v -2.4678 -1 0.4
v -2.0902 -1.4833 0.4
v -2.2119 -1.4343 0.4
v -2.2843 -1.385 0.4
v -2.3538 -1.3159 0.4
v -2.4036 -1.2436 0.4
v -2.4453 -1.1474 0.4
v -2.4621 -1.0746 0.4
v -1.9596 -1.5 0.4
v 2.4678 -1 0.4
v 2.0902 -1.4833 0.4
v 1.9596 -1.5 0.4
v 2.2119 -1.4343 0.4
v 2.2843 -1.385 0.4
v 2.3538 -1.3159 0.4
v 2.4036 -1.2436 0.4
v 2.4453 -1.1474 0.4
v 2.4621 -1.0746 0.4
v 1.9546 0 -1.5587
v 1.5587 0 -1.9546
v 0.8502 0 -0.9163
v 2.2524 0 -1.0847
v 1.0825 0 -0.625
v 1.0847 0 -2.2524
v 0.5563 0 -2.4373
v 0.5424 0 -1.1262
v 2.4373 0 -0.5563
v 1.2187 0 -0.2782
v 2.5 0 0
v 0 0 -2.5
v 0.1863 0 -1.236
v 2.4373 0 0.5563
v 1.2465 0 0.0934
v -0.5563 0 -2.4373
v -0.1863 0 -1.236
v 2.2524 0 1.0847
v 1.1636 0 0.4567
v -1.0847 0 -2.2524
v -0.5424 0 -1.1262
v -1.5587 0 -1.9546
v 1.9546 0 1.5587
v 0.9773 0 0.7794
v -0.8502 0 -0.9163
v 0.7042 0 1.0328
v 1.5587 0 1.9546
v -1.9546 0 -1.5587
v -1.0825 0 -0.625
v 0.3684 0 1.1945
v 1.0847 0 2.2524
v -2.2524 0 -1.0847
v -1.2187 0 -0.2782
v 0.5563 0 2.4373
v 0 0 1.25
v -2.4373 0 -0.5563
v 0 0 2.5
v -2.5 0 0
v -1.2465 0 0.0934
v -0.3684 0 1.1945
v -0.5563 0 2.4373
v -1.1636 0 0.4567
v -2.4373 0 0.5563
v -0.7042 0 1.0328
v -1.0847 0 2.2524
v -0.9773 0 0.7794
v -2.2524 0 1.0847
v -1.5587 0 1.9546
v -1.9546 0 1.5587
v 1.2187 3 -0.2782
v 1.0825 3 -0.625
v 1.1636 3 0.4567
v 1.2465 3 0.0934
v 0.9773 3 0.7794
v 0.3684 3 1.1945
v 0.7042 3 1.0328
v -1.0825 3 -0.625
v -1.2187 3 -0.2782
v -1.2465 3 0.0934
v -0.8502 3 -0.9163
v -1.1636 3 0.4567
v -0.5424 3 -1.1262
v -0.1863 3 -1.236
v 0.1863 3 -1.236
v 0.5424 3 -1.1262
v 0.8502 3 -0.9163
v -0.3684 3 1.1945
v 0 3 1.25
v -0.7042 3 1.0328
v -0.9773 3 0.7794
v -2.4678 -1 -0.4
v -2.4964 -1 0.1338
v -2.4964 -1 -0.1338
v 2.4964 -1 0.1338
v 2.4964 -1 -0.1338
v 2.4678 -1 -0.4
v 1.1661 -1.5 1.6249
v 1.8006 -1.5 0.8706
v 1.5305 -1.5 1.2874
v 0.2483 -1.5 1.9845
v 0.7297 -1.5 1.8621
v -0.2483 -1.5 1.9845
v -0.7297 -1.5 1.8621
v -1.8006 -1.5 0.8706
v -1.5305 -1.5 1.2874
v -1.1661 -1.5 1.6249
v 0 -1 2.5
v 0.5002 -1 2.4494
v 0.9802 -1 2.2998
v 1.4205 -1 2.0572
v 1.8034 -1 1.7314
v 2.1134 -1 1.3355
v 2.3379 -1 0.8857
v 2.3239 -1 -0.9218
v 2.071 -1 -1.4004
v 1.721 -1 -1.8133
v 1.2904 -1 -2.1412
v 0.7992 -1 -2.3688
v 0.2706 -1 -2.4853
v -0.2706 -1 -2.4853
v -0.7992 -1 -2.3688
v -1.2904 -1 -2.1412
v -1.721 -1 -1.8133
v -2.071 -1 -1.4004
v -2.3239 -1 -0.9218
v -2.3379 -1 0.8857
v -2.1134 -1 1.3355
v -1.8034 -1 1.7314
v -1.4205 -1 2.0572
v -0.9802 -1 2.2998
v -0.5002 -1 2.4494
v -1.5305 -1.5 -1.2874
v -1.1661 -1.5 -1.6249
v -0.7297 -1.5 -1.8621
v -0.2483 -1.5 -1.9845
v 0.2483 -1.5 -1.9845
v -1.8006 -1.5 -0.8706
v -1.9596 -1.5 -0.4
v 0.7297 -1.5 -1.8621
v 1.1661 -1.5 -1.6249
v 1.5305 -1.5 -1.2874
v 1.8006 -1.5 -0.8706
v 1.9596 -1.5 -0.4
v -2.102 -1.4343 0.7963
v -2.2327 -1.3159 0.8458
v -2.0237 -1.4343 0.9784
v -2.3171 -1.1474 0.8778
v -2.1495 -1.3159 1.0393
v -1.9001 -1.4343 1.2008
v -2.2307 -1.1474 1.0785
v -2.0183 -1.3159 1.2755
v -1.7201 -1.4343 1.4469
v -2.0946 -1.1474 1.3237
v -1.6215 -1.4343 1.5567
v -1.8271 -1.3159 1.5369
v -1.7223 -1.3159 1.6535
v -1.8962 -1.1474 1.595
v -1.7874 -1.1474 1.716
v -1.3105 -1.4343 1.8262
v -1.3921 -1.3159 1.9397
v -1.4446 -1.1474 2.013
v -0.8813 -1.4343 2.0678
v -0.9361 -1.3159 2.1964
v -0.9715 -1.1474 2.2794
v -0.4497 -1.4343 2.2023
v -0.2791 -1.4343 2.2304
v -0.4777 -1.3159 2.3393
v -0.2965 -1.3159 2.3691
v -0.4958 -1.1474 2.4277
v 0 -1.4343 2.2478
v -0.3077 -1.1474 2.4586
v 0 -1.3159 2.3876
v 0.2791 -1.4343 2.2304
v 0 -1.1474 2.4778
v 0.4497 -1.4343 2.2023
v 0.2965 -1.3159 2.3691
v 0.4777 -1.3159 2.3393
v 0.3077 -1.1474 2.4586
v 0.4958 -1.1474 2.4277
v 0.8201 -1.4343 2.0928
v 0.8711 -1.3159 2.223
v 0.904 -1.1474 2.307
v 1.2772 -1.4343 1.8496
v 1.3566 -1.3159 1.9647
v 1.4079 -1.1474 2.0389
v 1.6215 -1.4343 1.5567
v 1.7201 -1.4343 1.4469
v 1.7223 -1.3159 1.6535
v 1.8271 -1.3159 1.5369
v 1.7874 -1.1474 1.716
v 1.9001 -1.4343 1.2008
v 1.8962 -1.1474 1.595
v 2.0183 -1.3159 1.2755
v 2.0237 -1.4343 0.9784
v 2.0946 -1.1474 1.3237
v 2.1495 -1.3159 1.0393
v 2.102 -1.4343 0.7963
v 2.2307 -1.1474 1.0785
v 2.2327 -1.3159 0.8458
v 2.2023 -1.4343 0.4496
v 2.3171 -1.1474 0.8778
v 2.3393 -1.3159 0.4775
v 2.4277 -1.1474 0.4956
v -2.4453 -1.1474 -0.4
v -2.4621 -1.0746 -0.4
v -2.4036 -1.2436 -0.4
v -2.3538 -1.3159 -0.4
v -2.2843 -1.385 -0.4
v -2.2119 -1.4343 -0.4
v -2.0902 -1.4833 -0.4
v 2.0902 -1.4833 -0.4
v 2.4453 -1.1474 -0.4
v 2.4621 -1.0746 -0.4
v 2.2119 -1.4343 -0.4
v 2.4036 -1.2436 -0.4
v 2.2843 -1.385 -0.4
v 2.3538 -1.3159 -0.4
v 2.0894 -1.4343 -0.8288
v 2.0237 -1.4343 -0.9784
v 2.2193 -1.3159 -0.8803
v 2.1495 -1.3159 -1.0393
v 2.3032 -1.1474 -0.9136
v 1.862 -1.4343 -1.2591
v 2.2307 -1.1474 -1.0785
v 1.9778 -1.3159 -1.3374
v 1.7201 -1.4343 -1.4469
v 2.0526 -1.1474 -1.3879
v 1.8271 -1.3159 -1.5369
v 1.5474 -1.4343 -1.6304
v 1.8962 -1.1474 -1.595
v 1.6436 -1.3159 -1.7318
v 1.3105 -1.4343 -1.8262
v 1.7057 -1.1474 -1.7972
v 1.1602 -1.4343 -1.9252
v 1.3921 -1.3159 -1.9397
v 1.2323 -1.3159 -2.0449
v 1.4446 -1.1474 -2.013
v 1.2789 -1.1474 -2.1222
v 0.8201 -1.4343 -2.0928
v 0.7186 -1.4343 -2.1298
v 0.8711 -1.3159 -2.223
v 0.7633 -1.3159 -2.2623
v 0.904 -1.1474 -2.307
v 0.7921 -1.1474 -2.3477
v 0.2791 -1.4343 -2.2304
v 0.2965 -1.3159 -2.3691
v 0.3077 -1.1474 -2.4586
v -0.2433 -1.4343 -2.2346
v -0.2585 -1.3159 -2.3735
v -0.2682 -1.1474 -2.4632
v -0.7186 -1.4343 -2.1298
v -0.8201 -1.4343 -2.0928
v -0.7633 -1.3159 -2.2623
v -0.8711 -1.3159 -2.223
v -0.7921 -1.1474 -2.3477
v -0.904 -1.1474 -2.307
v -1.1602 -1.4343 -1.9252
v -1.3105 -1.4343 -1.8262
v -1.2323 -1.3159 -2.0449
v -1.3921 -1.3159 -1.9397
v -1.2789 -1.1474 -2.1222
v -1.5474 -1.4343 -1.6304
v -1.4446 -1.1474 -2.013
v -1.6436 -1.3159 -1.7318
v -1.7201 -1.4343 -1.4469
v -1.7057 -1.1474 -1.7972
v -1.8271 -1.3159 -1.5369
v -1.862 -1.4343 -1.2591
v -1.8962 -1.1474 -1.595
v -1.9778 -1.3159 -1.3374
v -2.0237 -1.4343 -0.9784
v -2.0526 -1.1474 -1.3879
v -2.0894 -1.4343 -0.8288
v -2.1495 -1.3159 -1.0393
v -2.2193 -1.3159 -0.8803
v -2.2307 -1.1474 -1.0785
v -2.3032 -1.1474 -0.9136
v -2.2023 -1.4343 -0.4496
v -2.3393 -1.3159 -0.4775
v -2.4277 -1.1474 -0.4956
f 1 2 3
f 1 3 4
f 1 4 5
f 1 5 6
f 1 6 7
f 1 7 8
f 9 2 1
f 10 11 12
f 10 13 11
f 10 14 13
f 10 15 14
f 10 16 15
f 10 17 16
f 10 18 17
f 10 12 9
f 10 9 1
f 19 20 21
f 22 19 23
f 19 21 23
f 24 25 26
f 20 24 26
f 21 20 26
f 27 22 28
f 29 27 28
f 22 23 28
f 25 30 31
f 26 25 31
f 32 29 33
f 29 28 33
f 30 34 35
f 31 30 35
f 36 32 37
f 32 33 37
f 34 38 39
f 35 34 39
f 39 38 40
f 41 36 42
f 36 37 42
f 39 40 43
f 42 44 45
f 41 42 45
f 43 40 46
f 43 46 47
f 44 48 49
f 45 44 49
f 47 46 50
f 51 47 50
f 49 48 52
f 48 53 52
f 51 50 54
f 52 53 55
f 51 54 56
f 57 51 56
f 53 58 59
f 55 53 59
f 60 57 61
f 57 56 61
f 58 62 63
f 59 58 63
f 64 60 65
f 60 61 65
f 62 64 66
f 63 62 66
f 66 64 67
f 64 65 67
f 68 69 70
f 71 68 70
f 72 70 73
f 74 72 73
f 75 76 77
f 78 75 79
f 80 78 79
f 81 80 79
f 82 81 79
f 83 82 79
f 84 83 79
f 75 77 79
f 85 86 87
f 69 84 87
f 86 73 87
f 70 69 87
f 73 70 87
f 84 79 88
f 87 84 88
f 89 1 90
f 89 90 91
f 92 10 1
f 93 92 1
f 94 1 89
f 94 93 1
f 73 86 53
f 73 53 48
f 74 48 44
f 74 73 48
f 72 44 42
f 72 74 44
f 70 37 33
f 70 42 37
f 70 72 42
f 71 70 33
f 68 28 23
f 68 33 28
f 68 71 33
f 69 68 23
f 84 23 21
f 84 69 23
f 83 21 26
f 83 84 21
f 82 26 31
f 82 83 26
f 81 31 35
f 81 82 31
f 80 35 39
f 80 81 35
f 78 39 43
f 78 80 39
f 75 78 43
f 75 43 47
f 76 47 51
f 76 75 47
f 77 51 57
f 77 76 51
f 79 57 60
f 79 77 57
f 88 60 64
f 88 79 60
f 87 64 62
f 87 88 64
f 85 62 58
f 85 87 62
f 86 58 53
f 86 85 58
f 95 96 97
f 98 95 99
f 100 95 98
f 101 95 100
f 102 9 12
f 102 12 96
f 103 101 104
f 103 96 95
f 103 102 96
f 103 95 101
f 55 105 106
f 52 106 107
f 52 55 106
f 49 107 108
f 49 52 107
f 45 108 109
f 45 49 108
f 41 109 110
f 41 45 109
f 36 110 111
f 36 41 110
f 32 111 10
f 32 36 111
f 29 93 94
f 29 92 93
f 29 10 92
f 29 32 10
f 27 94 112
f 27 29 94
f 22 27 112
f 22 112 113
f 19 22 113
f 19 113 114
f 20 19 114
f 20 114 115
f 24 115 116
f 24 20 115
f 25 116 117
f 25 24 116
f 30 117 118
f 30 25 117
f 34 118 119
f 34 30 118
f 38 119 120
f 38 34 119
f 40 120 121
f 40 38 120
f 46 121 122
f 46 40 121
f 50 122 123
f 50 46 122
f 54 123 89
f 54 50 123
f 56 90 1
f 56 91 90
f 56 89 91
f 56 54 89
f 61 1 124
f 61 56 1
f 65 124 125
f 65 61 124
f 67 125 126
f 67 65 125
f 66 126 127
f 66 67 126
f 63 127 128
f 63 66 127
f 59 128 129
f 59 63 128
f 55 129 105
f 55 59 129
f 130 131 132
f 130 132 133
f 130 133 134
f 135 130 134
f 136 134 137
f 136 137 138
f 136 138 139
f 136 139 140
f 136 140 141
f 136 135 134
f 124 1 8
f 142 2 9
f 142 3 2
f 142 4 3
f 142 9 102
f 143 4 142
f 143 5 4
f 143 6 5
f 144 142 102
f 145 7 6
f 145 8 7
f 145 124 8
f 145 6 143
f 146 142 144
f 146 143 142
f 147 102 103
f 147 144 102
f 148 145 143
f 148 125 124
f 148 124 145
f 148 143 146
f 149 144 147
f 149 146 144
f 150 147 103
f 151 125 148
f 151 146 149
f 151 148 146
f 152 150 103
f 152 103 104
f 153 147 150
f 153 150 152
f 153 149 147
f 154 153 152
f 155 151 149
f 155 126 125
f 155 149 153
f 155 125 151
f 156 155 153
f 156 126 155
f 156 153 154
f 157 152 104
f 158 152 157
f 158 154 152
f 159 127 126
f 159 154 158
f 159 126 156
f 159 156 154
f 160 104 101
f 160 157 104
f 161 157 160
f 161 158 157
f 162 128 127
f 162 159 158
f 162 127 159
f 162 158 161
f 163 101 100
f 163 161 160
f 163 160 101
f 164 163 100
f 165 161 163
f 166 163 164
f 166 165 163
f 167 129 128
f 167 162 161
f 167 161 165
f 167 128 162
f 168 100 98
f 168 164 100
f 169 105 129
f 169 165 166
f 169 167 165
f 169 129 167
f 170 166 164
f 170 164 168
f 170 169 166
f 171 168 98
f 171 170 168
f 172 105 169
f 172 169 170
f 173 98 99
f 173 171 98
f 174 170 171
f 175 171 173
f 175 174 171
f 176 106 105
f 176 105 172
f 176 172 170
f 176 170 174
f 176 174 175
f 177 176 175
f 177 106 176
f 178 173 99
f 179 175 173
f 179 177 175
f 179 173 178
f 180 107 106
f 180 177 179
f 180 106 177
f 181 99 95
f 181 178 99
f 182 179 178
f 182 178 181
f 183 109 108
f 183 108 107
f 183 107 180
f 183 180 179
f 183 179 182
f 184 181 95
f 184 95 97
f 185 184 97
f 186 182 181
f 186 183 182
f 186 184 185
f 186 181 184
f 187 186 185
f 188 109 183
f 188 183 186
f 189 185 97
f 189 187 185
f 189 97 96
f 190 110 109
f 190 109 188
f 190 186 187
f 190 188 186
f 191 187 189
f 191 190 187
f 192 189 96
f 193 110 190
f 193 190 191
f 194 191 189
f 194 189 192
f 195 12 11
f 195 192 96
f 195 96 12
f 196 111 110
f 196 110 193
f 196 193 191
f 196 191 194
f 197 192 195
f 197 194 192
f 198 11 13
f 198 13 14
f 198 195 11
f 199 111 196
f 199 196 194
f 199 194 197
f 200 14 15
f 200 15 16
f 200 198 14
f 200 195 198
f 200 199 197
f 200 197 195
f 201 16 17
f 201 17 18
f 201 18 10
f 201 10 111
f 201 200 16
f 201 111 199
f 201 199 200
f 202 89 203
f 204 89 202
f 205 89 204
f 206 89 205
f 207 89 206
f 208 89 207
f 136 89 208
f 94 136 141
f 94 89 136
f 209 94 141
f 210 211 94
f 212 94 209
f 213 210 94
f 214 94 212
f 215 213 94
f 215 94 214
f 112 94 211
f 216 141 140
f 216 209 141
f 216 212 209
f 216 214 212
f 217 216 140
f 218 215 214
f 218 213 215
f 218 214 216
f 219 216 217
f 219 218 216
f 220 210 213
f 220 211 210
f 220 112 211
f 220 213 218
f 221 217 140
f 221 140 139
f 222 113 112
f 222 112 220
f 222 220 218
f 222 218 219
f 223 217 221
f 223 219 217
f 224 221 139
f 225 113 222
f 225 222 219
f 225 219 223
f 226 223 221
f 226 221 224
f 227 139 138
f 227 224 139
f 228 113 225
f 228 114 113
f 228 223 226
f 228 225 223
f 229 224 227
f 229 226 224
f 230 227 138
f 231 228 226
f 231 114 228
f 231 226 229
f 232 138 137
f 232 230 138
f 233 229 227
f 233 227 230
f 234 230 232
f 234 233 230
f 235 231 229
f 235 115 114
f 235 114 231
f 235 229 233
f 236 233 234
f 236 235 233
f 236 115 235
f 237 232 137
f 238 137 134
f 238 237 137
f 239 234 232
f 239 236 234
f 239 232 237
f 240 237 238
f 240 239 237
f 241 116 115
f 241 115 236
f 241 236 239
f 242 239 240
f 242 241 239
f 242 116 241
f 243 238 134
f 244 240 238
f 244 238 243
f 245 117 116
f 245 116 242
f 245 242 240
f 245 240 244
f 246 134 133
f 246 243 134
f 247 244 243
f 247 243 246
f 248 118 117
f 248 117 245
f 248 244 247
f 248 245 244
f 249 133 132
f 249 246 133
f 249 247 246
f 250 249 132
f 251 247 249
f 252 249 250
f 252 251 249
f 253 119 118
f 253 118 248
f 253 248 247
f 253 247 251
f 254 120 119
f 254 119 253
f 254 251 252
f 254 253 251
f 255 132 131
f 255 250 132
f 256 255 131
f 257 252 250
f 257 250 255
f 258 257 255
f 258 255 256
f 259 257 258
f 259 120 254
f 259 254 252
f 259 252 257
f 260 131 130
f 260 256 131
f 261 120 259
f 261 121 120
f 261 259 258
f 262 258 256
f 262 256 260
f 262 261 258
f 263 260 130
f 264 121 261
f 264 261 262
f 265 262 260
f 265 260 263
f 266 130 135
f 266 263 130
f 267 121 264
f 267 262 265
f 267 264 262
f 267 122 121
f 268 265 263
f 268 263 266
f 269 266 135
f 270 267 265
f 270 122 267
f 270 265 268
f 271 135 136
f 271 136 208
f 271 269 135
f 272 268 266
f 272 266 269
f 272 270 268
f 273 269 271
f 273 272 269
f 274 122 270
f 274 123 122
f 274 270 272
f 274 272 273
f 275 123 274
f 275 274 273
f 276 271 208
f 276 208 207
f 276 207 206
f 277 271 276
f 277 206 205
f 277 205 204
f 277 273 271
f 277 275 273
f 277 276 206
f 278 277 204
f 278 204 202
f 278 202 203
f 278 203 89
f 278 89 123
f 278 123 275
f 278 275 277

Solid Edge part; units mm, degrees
sketch "Sketch1" plane through (0, 0, 0) normal (1, 0, 0) x (0, 1, 0)
  line L0 (3, 0) -> (-1.5, 0)
  line L1 (-1.5, 0) -> (-1.5, 2)
  arc A0 (-1.5, 2) -> (-1, 2.5) centre (-1, 2) cw
  line L2 (-1, 2.5) -> (0, 2.5)
  line L3 (0, 2.5) -> (0, 1.25)
  line L4 (0, 1.25) -> (3, 1.25)
  line L5 (3, 1.25) -> (3, 0)
revolve "RevolvedProtrusion1" add sketch "Sketch1" angle 360 about axis through (0, 38.2678, 0) along (0, -1, 0)
sketch "Sketch2" plane through (0, 0, 0) normal (1, 0, 0) x (0, 1, 0)
  line L0 (-1, -0.4) -> (-1.5, -0.4)
  line L1 (-1.5, -0.4) -> (-1.5, 0.4)
  line L2 (-1.5, 0.4) -> (-1, 0.4)
  line L3 (-1, 0.4) -> (-1, -0.4)
extrude "Cutout1" cut sketch "Sketch2" against normal up to next and the other way up to next
